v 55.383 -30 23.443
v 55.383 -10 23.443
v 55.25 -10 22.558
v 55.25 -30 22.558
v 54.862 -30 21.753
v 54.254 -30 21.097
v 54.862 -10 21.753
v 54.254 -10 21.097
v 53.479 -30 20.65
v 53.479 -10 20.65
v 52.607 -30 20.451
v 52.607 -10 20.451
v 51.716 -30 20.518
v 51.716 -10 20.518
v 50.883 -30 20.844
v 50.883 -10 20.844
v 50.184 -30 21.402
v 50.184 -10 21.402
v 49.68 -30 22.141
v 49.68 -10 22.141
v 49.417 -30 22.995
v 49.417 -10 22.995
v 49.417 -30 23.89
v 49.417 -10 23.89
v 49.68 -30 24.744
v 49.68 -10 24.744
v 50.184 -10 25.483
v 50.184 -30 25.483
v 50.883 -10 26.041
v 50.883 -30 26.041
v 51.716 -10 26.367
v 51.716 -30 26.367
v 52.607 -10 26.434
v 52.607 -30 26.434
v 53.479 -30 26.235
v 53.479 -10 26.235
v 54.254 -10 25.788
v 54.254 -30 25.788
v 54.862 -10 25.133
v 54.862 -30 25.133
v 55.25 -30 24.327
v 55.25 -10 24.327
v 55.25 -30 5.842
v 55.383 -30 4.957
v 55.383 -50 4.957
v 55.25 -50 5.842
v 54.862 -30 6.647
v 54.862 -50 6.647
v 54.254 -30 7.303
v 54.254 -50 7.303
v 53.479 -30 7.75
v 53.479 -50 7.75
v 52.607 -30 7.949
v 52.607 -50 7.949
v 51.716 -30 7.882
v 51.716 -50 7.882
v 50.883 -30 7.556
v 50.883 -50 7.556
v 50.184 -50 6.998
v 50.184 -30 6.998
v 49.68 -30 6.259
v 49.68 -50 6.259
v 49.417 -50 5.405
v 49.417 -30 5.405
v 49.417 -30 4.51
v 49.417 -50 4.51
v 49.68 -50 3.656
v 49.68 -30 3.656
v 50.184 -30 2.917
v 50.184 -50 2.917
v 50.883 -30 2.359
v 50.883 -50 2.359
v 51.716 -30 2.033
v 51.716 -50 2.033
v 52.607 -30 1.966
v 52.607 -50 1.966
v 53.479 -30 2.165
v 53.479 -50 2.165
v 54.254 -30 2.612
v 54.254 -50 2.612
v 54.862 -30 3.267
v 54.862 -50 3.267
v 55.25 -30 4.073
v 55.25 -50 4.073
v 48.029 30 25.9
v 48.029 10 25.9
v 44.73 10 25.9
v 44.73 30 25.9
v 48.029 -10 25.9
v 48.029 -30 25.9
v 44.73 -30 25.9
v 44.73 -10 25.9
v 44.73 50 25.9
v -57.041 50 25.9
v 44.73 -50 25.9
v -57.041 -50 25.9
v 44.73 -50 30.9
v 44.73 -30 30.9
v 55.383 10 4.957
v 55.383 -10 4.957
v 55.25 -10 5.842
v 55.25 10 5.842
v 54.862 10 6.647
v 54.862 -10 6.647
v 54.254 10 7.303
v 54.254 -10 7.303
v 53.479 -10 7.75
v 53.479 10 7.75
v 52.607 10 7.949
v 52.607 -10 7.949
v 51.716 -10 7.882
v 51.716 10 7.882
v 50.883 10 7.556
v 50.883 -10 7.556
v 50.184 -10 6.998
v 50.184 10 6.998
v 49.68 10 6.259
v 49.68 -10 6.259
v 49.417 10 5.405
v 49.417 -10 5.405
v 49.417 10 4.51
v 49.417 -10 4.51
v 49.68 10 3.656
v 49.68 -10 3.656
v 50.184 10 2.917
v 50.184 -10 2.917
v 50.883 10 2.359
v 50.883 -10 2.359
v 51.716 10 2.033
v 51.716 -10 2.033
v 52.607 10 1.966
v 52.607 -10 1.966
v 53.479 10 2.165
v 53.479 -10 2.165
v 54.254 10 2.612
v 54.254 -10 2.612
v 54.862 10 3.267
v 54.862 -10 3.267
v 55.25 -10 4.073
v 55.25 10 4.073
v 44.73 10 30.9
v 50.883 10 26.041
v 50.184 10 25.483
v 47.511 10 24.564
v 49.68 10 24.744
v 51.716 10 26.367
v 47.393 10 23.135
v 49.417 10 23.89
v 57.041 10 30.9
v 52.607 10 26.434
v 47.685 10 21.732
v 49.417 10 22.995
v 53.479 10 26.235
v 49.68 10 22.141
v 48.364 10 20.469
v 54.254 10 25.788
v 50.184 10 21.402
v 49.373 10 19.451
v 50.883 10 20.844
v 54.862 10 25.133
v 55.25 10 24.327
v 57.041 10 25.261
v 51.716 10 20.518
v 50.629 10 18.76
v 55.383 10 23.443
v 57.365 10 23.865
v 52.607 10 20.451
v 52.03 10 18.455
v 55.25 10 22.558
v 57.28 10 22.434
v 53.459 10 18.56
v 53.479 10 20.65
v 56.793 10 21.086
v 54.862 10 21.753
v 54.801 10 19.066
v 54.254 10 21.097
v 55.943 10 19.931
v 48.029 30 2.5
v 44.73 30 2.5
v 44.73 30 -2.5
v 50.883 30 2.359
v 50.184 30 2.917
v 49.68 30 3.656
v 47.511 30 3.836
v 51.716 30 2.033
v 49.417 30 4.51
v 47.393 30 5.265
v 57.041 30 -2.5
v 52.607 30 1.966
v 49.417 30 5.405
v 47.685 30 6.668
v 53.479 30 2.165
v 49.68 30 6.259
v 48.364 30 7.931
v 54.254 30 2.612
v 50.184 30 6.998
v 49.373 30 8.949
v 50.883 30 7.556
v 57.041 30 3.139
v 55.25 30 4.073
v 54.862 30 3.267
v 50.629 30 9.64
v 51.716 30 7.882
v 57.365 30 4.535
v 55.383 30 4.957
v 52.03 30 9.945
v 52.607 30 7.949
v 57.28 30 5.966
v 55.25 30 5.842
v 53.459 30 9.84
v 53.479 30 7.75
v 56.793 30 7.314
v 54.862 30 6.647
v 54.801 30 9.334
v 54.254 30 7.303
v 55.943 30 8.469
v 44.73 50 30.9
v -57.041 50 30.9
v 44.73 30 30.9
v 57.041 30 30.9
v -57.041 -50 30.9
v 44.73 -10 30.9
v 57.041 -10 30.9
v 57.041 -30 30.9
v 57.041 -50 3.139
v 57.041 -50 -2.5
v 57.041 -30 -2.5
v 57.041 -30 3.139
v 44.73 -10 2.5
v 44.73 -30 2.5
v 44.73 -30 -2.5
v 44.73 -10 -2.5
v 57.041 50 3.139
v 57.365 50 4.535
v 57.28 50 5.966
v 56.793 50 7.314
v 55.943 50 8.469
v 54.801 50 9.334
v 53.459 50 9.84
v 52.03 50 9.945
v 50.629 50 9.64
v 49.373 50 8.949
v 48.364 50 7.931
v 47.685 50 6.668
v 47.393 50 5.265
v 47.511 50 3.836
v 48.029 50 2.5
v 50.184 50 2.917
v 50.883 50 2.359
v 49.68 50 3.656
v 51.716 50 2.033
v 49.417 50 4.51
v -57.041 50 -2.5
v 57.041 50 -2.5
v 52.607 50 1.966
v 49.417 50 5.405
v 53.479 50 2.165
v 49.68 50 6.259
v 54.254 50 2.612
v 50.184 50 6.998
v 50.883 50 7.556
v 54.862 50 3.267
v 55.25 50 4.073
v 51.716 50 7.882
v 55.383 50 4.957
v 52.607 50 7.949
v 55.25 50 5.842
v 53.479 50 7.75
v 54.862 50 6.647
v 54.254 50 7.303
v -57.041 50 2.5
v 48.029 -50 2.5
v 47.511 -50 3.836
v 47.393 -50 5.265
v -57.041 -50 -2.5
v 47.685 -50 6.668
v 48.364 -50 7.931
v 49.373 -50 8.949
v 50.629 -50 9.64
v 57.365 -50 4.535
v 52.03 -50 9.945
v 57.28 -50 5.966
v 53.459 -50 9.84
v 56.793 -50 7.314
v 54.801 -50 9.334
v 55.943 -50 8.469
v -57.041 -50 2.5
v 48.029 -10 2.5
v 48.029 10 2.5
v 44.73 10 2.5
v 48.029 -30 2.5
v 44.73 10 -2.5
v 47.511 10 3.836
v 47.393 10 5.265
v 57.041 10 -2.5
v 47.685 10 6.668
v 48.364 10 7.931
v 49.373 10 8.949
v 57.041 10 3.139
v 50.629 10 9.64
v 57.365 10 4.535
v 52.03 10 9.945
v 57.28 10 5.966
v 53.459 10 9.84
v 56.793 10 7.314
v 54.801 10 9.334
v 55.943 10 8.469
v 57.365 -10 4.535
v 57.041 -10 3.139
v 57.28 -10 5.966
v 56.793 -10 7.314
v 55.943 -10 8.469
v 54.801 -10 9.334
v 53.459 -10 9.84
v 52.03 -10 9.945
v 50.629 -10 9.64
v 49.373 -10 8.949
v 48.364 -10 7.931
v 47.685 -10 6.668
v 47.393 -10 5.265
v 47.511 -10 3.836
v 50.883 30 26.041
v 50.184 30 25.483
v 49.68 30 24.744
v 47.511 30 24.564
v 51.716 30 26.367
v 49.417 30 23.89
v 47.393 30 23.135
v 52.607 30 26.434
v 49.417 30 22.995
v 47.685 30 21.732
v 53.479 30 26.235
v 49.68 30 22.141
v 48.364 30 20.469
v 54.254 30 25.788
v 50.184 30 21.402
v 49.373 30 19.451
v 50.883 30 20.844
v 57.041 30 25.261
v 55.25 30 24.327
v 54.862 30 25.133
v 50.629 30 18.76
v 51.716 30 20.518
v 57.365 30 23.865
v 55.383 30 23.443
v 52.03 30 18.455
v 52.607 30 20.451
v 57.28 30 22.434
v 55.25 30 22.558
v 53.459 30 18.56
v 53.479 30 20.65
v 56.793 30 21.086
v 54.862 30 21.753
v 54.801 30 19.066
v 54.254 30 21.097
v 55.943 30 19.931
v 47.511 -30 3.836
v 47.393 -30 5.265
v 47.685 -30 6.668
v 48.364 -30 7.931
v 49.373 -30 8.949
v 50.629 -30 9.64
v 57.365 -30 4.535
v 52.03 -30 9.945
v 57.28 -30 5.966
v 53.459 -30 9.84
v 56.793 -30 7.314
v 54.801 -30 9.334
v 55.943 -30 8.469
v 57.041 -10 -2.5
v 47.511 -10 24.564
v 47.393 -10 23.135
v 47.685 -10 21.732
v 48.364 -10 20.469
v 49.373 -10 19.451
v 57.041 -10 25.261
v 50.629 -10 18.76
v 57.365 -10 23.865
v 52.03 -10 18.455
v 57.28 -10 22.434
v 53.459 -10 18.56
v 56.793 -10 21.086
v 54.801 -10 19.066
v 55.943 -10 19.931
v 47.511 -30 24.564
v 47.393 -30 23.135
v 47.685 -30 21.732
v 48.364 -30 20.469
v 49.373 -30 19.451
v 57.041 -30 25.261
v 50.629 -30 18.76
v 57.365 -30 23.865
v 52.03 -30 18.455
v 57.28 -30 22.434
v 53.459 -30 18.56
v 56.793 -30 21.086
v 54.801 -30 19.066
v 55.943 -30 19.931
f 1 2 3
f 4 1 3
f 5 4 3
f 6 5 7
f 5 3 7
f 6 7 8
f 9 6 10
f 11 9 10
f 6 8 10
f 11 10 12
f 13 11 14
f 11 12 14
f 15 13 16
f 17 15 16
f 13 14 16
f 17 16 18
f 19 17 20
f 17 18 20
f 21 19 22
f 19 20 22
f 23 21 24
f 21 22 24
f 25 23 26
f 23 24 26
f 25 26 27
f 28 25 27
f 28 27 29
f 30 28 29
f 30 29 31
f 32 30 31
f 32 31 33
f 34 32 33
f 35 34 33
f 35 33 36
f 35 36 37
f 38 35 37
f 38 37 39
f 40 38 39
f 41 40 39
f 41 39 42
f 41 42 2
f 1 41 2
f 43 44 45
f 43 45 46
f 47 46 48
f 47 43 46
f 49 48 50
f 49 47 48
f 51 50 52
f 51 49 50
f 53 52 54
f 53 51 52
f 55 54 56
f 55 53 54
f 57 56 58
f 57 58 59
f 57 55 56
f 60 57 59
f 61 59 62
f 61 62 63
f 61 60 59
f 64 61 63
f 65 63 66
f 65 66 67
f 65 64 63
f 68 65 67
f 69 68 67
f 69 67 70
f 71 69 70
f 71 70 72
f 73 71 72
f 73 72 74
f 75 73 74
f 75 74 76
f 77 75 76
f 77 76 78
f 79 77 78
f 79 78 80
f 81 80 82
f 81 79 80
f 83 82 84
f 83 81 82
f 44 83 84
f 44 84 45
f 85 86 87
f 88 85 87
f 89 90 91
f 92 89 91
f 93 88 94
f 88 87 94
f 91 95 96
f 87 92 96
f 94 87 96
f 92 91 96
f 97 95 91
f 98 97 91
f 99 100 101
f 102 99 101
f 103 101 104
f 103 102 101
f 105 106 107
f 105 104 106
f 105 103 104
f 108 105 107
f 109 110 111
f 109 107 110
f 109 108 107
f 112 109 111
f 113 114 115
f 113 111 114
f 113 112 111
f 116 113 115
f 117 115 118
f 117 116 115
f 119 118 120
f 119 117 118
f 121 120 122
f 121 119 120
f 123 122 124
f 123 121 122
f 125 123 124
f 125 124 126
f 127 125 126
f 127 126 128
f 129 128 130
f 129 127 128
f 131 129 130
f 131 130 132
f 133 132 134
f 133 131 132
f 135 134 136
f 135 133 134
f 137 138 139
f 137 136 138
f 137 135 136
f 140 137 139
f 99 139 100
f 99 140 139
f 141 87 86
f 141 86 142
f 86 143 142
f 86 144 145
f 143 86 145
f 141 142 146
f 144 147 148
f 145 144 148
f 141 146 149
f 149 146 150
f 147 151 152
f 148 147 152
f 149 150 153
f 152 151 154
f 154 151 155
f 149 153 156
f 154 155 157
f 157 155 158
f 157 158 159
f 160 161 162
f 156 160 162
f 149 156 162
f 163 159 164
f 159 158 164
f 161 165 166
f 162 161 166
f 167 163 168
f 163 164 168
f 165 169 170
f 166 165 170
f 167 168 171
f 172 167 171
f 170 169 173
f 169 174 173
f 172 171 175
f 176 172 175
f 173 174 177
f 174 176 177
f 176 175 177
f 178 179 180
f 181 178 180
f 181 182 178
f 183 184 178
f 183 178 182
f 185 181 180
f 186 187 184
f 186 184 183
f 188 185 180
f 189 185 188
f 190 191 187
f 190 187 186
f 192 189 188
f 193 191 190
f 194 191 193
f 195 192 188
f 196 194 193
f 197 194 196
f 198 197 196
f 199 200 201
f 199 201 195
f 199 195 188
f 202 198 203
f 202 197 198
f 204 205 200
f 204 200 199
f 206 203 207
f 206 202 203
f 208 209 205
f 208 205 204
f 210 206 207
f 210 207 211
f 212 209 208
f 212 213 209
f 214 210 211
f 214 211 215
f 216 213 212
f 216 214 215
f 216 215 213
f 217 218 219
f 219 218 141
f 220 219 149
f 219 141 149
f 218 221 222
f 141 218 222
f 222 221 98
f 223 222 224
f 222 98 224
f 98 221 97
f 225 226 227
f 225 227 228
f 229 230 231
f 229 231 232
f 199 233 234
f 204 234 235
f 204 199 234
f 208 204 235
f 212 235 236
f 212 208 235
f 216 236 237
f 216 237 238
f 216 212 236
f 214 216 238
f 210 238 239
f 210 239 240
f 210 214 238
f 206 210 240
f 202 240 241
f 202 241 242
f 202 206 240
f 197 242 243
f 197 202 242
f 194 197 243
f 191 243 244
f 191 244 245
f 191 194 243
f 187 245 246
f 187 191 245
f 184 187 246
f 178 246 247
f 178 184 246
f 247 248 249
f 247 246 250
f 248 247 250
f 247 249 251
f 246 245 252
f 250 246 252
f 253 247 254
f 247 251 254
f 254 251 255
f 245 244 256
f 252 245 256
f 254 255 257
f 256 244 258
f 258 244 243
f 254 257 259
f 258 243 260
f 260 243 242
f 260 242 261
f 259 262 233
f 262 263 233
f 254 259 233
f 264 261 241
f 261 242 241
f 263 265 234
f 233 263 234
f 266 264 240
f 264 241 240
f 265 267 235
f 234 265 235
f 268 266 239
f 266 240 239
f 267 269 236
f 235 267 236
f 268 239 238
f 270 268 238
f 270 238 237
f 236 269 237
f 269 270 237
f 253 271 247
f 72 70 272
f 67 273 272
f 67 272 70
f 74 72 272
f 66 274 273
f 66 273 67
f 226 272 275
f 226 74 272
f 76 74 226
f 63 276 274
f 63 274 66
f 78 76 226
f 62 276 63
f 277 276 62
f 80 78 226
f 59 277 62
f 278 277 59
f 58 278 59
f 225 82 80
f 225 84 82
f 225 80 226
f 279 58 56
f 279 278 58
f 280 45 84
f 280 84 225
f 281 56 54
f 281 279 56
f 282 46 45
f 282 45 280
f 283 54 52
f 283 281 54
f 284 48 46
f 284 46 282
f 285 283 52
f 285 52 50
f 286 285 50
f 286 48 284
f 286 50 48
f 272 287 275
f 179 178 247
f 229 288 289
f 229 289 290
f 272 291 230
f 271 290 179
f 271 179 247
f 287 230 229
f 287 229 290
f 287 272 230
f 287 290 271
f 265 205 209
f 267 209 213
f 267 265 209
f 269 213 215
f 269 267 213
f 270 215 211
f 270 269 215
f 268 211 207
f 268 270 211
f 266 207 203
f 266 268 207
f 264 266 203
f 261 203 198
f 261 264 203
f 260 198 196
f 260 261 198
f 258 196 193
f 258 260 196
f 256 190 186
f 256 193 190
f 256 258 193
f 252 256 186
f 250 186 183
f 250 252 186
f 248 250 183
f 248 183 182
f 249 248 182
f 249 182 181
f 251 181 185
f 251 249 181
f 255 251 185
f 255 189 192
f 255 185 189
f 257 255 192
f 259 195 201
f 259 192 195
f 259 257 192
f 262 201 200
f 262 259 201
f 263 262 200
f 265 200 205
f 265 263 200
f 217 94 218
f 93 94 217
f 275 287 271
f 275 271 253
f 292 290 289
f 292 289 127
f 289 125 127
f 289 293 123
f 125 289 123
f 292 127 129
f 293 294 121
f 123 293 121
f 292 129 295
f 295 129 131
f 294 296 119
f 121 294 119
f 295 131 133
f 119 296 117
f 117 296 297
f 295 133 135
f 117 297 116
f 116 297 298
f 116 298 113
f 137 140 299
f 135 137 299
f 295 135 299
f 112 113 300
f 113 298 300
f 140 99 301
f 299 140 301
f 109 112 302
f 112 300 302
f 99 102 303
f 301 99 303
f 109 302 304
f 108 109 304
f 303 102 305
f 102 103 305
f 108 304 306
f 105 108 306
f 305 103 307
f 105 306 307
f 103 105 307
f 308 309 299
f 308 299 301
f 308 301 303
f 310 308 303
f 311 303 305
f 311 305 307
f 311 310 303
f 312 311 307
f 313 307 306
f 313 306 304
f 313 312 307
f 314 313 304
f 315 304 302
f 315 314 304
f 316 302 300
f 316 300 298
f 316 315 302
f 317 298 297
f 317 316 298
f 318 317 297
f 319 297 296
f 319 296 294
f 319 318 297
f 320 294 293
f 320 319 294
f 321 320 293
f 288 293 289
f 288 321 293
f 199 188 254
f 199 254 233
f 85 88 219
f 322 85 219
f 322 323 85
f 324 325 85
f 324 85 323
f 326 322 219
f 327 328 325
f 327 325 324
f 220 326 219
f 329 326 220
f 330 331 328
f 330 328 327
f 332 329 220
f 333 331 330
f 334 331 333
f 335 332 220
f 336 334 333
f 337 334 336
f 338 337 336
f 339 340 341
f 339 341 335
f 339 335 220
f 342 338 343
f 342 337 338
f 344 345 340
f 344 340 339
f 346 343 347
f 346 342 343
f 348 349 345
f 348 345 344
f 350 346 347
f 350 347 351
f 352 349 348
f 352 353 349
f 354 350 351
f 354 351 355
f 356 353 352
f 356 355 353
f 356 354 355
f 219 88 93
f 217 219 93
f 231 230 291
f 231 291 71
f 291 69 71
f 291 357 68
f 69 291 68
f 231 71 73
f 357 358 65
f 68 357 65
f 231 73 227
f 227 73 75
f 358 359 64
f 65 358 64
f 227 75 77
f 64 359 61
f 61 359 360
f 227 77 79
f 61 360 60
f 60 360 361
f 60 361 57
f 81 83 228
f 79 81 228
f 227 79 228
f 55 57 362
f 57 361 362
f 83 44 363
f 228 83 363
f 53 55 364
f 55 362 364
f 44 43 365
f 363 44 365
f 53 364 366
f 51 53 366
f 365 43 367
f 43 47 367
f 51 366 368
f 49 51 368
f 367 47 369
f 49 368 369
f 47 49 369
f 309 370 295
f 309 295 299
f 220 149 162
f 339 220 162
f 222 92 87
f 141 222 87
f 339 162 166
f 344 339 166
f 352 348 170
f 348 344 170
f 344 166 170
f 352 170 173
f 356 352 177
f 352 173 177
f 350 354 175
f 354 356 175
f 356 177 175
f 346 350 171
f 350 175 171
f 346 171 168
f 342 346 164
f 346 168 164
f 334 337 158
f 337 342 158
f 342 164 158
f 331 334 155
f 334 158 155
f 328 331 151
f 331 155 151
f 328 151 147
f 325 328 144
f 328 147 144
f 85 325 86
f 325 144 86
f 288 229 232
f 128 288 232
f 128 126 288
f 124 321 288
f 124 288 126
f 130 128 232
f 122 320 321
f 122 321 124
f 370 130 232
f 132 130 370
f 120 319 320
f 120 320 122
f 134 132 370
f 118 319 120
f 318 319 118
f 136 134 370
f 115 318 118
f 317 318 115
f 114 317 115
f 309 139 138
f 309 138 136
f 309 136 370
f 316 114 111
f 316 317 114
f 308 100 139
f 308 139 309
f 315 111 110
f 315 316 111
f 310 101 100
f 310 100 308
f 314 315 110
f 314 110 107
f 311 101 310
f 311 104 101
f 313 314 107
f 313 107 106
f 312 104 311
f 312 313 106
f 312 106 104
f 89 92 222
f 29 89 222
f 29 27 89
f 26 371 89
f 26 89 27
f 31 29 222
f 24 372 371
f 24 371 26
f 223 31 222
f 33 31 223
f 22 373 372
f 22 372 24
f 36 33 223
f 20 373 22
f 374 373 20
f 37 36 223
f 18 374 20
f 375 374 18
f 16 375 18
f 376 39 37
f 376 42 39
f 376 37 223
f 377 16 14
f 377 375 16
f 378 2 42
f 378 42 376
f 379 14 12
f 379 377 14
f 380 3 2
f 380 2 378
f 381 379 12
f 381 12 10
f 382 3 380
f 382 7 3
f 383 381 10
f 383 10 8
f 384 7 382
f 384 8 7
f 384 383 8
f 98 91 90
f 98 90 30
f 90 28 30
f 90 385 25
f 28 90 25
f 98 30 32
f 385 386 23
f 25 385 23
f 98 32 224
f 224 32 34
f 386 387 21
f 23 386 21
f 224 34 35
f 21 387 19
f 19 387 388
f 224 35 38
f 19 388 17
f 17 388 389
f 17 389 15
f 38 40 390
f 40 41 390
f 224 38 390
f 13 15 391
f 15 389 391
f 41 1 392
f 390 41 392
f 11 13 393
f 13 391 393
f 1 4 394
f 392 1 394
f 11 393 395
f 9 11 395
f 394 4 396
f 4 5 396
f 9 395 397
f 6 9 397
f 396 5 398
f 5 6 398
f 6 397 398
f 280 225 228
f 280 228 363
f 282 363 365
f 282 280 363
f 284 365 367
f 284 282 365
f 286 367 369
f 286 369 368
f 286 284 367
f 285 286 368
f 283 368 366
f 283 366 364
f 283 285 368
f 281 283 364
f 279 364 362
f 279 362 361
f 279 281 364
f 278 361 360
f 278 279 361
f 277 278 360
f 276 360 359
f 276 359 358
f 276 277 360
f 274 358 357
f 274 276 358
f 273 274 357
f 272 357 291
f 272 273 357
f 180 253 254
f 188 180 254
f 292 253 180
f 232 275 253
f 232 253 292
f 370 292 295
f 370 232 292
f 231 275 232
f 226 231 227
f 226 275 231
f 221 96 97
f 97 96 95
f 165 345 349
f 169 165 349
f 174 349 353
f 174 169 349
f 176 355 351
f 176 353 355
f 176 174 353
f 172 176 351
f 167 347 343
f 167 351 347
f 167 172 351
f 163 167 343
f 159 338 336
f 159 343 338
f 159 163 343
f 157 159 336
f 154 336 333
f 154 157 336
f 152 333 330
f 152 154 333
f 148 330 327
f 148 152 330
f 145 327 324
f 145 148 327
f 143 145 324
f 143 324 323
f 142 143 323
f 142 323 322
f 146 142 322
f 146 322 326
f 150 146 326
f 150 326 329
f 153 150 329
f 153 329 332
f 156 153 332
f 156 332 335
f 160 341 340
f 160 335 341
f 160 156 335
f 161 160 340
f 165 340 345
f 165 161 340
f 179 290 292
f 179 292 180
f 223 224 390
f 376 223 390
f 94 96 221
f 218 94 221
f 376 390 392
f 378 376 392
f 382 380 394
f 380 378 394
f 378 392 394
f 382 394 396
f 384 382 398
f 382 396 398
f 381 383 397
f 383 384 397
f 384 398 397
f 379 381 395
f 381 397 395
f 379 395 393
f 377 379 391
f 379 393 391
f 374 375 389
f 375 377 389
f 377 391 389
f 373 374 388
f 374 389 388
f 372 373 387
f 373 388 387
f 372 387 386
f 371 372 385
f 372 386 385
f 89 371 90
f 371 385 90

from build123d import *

# Parameters (mm, degrees)
F0_R          = 3
F1_DEPTH      = 50
F1_DEPTH_BACK = 50
F3_W          = 22.0232212332
F3_H          = 20
F6_DEPTH      = 25
F7_DEPTH      = 25


with BuildPart() as f1:
    # F0 (on Front) → F1 (new body, two sides)
    with BuildSketch(Plane.XZ) as f1_sk:
        with BuildLine():
            ThreePointArc((57.0408962667, 3.1389844976), (52.029669329, 9.9449223914), (48.0288798293, 2.5))
            Line((48.0288798293, 2.5), (-57.0408962667, 2.5))
            Line((-57.0408962667, 2.5), (-57.0408962667, -2.5))
            Line((-57.0408962667, -2.5), (57.0408962667, -2.5))
            Line((57.0408962667, -2.5), (57.0408962667, 3.1389844976))
        make_face()
        with Locations((52.3832995862, 4.9574435051)):
            Circle(F0_R, mode=Mode.SUBTRACT)
    extrude(amount=F1_DEPTH)
    extrude(f1_sk.sketch, amount=-F1_DEPTH_BACK)


with BuildPart() as f5_1:
    # F5: instance of F1
    add(f1.part.mirror(Plane.XY.offset(14.2)))

    # F3 (on offset) → F7 (cut)
    with BuildSketch(Plane.XY.offset(13.1)):
        with Locations((55.7416907957, 40)):
            Rectangle(F3_W, F3_H)
        with Locations((55.7416907957, 0)):
            Rectangle(F3_W, F3_H)
        with Locations((55.7416907957, -40)):
            Rectangle(F3_W, F3_H)
    extrude(amount=F7_DEPTH, mode=Mode.SUBTRACT)


with BuildPart() as f1_1:
    add(f1.part)

    # F3 (on offset) → F6 (cut)
    with BuildSketch(Plane.XY.offset(13.1)):
        with Locations((55.7416907957, 20)):
            Rectangle(F3_W, F3_H)
        with Locations((55.7416907957, -20)):
            Rectangle(F3_W, F3_H)
    extrude(amount=-F6_DEPTH, mode=Mode.SUBTRACT)


solid = Compound([f5_1.part, f1_1.part])
